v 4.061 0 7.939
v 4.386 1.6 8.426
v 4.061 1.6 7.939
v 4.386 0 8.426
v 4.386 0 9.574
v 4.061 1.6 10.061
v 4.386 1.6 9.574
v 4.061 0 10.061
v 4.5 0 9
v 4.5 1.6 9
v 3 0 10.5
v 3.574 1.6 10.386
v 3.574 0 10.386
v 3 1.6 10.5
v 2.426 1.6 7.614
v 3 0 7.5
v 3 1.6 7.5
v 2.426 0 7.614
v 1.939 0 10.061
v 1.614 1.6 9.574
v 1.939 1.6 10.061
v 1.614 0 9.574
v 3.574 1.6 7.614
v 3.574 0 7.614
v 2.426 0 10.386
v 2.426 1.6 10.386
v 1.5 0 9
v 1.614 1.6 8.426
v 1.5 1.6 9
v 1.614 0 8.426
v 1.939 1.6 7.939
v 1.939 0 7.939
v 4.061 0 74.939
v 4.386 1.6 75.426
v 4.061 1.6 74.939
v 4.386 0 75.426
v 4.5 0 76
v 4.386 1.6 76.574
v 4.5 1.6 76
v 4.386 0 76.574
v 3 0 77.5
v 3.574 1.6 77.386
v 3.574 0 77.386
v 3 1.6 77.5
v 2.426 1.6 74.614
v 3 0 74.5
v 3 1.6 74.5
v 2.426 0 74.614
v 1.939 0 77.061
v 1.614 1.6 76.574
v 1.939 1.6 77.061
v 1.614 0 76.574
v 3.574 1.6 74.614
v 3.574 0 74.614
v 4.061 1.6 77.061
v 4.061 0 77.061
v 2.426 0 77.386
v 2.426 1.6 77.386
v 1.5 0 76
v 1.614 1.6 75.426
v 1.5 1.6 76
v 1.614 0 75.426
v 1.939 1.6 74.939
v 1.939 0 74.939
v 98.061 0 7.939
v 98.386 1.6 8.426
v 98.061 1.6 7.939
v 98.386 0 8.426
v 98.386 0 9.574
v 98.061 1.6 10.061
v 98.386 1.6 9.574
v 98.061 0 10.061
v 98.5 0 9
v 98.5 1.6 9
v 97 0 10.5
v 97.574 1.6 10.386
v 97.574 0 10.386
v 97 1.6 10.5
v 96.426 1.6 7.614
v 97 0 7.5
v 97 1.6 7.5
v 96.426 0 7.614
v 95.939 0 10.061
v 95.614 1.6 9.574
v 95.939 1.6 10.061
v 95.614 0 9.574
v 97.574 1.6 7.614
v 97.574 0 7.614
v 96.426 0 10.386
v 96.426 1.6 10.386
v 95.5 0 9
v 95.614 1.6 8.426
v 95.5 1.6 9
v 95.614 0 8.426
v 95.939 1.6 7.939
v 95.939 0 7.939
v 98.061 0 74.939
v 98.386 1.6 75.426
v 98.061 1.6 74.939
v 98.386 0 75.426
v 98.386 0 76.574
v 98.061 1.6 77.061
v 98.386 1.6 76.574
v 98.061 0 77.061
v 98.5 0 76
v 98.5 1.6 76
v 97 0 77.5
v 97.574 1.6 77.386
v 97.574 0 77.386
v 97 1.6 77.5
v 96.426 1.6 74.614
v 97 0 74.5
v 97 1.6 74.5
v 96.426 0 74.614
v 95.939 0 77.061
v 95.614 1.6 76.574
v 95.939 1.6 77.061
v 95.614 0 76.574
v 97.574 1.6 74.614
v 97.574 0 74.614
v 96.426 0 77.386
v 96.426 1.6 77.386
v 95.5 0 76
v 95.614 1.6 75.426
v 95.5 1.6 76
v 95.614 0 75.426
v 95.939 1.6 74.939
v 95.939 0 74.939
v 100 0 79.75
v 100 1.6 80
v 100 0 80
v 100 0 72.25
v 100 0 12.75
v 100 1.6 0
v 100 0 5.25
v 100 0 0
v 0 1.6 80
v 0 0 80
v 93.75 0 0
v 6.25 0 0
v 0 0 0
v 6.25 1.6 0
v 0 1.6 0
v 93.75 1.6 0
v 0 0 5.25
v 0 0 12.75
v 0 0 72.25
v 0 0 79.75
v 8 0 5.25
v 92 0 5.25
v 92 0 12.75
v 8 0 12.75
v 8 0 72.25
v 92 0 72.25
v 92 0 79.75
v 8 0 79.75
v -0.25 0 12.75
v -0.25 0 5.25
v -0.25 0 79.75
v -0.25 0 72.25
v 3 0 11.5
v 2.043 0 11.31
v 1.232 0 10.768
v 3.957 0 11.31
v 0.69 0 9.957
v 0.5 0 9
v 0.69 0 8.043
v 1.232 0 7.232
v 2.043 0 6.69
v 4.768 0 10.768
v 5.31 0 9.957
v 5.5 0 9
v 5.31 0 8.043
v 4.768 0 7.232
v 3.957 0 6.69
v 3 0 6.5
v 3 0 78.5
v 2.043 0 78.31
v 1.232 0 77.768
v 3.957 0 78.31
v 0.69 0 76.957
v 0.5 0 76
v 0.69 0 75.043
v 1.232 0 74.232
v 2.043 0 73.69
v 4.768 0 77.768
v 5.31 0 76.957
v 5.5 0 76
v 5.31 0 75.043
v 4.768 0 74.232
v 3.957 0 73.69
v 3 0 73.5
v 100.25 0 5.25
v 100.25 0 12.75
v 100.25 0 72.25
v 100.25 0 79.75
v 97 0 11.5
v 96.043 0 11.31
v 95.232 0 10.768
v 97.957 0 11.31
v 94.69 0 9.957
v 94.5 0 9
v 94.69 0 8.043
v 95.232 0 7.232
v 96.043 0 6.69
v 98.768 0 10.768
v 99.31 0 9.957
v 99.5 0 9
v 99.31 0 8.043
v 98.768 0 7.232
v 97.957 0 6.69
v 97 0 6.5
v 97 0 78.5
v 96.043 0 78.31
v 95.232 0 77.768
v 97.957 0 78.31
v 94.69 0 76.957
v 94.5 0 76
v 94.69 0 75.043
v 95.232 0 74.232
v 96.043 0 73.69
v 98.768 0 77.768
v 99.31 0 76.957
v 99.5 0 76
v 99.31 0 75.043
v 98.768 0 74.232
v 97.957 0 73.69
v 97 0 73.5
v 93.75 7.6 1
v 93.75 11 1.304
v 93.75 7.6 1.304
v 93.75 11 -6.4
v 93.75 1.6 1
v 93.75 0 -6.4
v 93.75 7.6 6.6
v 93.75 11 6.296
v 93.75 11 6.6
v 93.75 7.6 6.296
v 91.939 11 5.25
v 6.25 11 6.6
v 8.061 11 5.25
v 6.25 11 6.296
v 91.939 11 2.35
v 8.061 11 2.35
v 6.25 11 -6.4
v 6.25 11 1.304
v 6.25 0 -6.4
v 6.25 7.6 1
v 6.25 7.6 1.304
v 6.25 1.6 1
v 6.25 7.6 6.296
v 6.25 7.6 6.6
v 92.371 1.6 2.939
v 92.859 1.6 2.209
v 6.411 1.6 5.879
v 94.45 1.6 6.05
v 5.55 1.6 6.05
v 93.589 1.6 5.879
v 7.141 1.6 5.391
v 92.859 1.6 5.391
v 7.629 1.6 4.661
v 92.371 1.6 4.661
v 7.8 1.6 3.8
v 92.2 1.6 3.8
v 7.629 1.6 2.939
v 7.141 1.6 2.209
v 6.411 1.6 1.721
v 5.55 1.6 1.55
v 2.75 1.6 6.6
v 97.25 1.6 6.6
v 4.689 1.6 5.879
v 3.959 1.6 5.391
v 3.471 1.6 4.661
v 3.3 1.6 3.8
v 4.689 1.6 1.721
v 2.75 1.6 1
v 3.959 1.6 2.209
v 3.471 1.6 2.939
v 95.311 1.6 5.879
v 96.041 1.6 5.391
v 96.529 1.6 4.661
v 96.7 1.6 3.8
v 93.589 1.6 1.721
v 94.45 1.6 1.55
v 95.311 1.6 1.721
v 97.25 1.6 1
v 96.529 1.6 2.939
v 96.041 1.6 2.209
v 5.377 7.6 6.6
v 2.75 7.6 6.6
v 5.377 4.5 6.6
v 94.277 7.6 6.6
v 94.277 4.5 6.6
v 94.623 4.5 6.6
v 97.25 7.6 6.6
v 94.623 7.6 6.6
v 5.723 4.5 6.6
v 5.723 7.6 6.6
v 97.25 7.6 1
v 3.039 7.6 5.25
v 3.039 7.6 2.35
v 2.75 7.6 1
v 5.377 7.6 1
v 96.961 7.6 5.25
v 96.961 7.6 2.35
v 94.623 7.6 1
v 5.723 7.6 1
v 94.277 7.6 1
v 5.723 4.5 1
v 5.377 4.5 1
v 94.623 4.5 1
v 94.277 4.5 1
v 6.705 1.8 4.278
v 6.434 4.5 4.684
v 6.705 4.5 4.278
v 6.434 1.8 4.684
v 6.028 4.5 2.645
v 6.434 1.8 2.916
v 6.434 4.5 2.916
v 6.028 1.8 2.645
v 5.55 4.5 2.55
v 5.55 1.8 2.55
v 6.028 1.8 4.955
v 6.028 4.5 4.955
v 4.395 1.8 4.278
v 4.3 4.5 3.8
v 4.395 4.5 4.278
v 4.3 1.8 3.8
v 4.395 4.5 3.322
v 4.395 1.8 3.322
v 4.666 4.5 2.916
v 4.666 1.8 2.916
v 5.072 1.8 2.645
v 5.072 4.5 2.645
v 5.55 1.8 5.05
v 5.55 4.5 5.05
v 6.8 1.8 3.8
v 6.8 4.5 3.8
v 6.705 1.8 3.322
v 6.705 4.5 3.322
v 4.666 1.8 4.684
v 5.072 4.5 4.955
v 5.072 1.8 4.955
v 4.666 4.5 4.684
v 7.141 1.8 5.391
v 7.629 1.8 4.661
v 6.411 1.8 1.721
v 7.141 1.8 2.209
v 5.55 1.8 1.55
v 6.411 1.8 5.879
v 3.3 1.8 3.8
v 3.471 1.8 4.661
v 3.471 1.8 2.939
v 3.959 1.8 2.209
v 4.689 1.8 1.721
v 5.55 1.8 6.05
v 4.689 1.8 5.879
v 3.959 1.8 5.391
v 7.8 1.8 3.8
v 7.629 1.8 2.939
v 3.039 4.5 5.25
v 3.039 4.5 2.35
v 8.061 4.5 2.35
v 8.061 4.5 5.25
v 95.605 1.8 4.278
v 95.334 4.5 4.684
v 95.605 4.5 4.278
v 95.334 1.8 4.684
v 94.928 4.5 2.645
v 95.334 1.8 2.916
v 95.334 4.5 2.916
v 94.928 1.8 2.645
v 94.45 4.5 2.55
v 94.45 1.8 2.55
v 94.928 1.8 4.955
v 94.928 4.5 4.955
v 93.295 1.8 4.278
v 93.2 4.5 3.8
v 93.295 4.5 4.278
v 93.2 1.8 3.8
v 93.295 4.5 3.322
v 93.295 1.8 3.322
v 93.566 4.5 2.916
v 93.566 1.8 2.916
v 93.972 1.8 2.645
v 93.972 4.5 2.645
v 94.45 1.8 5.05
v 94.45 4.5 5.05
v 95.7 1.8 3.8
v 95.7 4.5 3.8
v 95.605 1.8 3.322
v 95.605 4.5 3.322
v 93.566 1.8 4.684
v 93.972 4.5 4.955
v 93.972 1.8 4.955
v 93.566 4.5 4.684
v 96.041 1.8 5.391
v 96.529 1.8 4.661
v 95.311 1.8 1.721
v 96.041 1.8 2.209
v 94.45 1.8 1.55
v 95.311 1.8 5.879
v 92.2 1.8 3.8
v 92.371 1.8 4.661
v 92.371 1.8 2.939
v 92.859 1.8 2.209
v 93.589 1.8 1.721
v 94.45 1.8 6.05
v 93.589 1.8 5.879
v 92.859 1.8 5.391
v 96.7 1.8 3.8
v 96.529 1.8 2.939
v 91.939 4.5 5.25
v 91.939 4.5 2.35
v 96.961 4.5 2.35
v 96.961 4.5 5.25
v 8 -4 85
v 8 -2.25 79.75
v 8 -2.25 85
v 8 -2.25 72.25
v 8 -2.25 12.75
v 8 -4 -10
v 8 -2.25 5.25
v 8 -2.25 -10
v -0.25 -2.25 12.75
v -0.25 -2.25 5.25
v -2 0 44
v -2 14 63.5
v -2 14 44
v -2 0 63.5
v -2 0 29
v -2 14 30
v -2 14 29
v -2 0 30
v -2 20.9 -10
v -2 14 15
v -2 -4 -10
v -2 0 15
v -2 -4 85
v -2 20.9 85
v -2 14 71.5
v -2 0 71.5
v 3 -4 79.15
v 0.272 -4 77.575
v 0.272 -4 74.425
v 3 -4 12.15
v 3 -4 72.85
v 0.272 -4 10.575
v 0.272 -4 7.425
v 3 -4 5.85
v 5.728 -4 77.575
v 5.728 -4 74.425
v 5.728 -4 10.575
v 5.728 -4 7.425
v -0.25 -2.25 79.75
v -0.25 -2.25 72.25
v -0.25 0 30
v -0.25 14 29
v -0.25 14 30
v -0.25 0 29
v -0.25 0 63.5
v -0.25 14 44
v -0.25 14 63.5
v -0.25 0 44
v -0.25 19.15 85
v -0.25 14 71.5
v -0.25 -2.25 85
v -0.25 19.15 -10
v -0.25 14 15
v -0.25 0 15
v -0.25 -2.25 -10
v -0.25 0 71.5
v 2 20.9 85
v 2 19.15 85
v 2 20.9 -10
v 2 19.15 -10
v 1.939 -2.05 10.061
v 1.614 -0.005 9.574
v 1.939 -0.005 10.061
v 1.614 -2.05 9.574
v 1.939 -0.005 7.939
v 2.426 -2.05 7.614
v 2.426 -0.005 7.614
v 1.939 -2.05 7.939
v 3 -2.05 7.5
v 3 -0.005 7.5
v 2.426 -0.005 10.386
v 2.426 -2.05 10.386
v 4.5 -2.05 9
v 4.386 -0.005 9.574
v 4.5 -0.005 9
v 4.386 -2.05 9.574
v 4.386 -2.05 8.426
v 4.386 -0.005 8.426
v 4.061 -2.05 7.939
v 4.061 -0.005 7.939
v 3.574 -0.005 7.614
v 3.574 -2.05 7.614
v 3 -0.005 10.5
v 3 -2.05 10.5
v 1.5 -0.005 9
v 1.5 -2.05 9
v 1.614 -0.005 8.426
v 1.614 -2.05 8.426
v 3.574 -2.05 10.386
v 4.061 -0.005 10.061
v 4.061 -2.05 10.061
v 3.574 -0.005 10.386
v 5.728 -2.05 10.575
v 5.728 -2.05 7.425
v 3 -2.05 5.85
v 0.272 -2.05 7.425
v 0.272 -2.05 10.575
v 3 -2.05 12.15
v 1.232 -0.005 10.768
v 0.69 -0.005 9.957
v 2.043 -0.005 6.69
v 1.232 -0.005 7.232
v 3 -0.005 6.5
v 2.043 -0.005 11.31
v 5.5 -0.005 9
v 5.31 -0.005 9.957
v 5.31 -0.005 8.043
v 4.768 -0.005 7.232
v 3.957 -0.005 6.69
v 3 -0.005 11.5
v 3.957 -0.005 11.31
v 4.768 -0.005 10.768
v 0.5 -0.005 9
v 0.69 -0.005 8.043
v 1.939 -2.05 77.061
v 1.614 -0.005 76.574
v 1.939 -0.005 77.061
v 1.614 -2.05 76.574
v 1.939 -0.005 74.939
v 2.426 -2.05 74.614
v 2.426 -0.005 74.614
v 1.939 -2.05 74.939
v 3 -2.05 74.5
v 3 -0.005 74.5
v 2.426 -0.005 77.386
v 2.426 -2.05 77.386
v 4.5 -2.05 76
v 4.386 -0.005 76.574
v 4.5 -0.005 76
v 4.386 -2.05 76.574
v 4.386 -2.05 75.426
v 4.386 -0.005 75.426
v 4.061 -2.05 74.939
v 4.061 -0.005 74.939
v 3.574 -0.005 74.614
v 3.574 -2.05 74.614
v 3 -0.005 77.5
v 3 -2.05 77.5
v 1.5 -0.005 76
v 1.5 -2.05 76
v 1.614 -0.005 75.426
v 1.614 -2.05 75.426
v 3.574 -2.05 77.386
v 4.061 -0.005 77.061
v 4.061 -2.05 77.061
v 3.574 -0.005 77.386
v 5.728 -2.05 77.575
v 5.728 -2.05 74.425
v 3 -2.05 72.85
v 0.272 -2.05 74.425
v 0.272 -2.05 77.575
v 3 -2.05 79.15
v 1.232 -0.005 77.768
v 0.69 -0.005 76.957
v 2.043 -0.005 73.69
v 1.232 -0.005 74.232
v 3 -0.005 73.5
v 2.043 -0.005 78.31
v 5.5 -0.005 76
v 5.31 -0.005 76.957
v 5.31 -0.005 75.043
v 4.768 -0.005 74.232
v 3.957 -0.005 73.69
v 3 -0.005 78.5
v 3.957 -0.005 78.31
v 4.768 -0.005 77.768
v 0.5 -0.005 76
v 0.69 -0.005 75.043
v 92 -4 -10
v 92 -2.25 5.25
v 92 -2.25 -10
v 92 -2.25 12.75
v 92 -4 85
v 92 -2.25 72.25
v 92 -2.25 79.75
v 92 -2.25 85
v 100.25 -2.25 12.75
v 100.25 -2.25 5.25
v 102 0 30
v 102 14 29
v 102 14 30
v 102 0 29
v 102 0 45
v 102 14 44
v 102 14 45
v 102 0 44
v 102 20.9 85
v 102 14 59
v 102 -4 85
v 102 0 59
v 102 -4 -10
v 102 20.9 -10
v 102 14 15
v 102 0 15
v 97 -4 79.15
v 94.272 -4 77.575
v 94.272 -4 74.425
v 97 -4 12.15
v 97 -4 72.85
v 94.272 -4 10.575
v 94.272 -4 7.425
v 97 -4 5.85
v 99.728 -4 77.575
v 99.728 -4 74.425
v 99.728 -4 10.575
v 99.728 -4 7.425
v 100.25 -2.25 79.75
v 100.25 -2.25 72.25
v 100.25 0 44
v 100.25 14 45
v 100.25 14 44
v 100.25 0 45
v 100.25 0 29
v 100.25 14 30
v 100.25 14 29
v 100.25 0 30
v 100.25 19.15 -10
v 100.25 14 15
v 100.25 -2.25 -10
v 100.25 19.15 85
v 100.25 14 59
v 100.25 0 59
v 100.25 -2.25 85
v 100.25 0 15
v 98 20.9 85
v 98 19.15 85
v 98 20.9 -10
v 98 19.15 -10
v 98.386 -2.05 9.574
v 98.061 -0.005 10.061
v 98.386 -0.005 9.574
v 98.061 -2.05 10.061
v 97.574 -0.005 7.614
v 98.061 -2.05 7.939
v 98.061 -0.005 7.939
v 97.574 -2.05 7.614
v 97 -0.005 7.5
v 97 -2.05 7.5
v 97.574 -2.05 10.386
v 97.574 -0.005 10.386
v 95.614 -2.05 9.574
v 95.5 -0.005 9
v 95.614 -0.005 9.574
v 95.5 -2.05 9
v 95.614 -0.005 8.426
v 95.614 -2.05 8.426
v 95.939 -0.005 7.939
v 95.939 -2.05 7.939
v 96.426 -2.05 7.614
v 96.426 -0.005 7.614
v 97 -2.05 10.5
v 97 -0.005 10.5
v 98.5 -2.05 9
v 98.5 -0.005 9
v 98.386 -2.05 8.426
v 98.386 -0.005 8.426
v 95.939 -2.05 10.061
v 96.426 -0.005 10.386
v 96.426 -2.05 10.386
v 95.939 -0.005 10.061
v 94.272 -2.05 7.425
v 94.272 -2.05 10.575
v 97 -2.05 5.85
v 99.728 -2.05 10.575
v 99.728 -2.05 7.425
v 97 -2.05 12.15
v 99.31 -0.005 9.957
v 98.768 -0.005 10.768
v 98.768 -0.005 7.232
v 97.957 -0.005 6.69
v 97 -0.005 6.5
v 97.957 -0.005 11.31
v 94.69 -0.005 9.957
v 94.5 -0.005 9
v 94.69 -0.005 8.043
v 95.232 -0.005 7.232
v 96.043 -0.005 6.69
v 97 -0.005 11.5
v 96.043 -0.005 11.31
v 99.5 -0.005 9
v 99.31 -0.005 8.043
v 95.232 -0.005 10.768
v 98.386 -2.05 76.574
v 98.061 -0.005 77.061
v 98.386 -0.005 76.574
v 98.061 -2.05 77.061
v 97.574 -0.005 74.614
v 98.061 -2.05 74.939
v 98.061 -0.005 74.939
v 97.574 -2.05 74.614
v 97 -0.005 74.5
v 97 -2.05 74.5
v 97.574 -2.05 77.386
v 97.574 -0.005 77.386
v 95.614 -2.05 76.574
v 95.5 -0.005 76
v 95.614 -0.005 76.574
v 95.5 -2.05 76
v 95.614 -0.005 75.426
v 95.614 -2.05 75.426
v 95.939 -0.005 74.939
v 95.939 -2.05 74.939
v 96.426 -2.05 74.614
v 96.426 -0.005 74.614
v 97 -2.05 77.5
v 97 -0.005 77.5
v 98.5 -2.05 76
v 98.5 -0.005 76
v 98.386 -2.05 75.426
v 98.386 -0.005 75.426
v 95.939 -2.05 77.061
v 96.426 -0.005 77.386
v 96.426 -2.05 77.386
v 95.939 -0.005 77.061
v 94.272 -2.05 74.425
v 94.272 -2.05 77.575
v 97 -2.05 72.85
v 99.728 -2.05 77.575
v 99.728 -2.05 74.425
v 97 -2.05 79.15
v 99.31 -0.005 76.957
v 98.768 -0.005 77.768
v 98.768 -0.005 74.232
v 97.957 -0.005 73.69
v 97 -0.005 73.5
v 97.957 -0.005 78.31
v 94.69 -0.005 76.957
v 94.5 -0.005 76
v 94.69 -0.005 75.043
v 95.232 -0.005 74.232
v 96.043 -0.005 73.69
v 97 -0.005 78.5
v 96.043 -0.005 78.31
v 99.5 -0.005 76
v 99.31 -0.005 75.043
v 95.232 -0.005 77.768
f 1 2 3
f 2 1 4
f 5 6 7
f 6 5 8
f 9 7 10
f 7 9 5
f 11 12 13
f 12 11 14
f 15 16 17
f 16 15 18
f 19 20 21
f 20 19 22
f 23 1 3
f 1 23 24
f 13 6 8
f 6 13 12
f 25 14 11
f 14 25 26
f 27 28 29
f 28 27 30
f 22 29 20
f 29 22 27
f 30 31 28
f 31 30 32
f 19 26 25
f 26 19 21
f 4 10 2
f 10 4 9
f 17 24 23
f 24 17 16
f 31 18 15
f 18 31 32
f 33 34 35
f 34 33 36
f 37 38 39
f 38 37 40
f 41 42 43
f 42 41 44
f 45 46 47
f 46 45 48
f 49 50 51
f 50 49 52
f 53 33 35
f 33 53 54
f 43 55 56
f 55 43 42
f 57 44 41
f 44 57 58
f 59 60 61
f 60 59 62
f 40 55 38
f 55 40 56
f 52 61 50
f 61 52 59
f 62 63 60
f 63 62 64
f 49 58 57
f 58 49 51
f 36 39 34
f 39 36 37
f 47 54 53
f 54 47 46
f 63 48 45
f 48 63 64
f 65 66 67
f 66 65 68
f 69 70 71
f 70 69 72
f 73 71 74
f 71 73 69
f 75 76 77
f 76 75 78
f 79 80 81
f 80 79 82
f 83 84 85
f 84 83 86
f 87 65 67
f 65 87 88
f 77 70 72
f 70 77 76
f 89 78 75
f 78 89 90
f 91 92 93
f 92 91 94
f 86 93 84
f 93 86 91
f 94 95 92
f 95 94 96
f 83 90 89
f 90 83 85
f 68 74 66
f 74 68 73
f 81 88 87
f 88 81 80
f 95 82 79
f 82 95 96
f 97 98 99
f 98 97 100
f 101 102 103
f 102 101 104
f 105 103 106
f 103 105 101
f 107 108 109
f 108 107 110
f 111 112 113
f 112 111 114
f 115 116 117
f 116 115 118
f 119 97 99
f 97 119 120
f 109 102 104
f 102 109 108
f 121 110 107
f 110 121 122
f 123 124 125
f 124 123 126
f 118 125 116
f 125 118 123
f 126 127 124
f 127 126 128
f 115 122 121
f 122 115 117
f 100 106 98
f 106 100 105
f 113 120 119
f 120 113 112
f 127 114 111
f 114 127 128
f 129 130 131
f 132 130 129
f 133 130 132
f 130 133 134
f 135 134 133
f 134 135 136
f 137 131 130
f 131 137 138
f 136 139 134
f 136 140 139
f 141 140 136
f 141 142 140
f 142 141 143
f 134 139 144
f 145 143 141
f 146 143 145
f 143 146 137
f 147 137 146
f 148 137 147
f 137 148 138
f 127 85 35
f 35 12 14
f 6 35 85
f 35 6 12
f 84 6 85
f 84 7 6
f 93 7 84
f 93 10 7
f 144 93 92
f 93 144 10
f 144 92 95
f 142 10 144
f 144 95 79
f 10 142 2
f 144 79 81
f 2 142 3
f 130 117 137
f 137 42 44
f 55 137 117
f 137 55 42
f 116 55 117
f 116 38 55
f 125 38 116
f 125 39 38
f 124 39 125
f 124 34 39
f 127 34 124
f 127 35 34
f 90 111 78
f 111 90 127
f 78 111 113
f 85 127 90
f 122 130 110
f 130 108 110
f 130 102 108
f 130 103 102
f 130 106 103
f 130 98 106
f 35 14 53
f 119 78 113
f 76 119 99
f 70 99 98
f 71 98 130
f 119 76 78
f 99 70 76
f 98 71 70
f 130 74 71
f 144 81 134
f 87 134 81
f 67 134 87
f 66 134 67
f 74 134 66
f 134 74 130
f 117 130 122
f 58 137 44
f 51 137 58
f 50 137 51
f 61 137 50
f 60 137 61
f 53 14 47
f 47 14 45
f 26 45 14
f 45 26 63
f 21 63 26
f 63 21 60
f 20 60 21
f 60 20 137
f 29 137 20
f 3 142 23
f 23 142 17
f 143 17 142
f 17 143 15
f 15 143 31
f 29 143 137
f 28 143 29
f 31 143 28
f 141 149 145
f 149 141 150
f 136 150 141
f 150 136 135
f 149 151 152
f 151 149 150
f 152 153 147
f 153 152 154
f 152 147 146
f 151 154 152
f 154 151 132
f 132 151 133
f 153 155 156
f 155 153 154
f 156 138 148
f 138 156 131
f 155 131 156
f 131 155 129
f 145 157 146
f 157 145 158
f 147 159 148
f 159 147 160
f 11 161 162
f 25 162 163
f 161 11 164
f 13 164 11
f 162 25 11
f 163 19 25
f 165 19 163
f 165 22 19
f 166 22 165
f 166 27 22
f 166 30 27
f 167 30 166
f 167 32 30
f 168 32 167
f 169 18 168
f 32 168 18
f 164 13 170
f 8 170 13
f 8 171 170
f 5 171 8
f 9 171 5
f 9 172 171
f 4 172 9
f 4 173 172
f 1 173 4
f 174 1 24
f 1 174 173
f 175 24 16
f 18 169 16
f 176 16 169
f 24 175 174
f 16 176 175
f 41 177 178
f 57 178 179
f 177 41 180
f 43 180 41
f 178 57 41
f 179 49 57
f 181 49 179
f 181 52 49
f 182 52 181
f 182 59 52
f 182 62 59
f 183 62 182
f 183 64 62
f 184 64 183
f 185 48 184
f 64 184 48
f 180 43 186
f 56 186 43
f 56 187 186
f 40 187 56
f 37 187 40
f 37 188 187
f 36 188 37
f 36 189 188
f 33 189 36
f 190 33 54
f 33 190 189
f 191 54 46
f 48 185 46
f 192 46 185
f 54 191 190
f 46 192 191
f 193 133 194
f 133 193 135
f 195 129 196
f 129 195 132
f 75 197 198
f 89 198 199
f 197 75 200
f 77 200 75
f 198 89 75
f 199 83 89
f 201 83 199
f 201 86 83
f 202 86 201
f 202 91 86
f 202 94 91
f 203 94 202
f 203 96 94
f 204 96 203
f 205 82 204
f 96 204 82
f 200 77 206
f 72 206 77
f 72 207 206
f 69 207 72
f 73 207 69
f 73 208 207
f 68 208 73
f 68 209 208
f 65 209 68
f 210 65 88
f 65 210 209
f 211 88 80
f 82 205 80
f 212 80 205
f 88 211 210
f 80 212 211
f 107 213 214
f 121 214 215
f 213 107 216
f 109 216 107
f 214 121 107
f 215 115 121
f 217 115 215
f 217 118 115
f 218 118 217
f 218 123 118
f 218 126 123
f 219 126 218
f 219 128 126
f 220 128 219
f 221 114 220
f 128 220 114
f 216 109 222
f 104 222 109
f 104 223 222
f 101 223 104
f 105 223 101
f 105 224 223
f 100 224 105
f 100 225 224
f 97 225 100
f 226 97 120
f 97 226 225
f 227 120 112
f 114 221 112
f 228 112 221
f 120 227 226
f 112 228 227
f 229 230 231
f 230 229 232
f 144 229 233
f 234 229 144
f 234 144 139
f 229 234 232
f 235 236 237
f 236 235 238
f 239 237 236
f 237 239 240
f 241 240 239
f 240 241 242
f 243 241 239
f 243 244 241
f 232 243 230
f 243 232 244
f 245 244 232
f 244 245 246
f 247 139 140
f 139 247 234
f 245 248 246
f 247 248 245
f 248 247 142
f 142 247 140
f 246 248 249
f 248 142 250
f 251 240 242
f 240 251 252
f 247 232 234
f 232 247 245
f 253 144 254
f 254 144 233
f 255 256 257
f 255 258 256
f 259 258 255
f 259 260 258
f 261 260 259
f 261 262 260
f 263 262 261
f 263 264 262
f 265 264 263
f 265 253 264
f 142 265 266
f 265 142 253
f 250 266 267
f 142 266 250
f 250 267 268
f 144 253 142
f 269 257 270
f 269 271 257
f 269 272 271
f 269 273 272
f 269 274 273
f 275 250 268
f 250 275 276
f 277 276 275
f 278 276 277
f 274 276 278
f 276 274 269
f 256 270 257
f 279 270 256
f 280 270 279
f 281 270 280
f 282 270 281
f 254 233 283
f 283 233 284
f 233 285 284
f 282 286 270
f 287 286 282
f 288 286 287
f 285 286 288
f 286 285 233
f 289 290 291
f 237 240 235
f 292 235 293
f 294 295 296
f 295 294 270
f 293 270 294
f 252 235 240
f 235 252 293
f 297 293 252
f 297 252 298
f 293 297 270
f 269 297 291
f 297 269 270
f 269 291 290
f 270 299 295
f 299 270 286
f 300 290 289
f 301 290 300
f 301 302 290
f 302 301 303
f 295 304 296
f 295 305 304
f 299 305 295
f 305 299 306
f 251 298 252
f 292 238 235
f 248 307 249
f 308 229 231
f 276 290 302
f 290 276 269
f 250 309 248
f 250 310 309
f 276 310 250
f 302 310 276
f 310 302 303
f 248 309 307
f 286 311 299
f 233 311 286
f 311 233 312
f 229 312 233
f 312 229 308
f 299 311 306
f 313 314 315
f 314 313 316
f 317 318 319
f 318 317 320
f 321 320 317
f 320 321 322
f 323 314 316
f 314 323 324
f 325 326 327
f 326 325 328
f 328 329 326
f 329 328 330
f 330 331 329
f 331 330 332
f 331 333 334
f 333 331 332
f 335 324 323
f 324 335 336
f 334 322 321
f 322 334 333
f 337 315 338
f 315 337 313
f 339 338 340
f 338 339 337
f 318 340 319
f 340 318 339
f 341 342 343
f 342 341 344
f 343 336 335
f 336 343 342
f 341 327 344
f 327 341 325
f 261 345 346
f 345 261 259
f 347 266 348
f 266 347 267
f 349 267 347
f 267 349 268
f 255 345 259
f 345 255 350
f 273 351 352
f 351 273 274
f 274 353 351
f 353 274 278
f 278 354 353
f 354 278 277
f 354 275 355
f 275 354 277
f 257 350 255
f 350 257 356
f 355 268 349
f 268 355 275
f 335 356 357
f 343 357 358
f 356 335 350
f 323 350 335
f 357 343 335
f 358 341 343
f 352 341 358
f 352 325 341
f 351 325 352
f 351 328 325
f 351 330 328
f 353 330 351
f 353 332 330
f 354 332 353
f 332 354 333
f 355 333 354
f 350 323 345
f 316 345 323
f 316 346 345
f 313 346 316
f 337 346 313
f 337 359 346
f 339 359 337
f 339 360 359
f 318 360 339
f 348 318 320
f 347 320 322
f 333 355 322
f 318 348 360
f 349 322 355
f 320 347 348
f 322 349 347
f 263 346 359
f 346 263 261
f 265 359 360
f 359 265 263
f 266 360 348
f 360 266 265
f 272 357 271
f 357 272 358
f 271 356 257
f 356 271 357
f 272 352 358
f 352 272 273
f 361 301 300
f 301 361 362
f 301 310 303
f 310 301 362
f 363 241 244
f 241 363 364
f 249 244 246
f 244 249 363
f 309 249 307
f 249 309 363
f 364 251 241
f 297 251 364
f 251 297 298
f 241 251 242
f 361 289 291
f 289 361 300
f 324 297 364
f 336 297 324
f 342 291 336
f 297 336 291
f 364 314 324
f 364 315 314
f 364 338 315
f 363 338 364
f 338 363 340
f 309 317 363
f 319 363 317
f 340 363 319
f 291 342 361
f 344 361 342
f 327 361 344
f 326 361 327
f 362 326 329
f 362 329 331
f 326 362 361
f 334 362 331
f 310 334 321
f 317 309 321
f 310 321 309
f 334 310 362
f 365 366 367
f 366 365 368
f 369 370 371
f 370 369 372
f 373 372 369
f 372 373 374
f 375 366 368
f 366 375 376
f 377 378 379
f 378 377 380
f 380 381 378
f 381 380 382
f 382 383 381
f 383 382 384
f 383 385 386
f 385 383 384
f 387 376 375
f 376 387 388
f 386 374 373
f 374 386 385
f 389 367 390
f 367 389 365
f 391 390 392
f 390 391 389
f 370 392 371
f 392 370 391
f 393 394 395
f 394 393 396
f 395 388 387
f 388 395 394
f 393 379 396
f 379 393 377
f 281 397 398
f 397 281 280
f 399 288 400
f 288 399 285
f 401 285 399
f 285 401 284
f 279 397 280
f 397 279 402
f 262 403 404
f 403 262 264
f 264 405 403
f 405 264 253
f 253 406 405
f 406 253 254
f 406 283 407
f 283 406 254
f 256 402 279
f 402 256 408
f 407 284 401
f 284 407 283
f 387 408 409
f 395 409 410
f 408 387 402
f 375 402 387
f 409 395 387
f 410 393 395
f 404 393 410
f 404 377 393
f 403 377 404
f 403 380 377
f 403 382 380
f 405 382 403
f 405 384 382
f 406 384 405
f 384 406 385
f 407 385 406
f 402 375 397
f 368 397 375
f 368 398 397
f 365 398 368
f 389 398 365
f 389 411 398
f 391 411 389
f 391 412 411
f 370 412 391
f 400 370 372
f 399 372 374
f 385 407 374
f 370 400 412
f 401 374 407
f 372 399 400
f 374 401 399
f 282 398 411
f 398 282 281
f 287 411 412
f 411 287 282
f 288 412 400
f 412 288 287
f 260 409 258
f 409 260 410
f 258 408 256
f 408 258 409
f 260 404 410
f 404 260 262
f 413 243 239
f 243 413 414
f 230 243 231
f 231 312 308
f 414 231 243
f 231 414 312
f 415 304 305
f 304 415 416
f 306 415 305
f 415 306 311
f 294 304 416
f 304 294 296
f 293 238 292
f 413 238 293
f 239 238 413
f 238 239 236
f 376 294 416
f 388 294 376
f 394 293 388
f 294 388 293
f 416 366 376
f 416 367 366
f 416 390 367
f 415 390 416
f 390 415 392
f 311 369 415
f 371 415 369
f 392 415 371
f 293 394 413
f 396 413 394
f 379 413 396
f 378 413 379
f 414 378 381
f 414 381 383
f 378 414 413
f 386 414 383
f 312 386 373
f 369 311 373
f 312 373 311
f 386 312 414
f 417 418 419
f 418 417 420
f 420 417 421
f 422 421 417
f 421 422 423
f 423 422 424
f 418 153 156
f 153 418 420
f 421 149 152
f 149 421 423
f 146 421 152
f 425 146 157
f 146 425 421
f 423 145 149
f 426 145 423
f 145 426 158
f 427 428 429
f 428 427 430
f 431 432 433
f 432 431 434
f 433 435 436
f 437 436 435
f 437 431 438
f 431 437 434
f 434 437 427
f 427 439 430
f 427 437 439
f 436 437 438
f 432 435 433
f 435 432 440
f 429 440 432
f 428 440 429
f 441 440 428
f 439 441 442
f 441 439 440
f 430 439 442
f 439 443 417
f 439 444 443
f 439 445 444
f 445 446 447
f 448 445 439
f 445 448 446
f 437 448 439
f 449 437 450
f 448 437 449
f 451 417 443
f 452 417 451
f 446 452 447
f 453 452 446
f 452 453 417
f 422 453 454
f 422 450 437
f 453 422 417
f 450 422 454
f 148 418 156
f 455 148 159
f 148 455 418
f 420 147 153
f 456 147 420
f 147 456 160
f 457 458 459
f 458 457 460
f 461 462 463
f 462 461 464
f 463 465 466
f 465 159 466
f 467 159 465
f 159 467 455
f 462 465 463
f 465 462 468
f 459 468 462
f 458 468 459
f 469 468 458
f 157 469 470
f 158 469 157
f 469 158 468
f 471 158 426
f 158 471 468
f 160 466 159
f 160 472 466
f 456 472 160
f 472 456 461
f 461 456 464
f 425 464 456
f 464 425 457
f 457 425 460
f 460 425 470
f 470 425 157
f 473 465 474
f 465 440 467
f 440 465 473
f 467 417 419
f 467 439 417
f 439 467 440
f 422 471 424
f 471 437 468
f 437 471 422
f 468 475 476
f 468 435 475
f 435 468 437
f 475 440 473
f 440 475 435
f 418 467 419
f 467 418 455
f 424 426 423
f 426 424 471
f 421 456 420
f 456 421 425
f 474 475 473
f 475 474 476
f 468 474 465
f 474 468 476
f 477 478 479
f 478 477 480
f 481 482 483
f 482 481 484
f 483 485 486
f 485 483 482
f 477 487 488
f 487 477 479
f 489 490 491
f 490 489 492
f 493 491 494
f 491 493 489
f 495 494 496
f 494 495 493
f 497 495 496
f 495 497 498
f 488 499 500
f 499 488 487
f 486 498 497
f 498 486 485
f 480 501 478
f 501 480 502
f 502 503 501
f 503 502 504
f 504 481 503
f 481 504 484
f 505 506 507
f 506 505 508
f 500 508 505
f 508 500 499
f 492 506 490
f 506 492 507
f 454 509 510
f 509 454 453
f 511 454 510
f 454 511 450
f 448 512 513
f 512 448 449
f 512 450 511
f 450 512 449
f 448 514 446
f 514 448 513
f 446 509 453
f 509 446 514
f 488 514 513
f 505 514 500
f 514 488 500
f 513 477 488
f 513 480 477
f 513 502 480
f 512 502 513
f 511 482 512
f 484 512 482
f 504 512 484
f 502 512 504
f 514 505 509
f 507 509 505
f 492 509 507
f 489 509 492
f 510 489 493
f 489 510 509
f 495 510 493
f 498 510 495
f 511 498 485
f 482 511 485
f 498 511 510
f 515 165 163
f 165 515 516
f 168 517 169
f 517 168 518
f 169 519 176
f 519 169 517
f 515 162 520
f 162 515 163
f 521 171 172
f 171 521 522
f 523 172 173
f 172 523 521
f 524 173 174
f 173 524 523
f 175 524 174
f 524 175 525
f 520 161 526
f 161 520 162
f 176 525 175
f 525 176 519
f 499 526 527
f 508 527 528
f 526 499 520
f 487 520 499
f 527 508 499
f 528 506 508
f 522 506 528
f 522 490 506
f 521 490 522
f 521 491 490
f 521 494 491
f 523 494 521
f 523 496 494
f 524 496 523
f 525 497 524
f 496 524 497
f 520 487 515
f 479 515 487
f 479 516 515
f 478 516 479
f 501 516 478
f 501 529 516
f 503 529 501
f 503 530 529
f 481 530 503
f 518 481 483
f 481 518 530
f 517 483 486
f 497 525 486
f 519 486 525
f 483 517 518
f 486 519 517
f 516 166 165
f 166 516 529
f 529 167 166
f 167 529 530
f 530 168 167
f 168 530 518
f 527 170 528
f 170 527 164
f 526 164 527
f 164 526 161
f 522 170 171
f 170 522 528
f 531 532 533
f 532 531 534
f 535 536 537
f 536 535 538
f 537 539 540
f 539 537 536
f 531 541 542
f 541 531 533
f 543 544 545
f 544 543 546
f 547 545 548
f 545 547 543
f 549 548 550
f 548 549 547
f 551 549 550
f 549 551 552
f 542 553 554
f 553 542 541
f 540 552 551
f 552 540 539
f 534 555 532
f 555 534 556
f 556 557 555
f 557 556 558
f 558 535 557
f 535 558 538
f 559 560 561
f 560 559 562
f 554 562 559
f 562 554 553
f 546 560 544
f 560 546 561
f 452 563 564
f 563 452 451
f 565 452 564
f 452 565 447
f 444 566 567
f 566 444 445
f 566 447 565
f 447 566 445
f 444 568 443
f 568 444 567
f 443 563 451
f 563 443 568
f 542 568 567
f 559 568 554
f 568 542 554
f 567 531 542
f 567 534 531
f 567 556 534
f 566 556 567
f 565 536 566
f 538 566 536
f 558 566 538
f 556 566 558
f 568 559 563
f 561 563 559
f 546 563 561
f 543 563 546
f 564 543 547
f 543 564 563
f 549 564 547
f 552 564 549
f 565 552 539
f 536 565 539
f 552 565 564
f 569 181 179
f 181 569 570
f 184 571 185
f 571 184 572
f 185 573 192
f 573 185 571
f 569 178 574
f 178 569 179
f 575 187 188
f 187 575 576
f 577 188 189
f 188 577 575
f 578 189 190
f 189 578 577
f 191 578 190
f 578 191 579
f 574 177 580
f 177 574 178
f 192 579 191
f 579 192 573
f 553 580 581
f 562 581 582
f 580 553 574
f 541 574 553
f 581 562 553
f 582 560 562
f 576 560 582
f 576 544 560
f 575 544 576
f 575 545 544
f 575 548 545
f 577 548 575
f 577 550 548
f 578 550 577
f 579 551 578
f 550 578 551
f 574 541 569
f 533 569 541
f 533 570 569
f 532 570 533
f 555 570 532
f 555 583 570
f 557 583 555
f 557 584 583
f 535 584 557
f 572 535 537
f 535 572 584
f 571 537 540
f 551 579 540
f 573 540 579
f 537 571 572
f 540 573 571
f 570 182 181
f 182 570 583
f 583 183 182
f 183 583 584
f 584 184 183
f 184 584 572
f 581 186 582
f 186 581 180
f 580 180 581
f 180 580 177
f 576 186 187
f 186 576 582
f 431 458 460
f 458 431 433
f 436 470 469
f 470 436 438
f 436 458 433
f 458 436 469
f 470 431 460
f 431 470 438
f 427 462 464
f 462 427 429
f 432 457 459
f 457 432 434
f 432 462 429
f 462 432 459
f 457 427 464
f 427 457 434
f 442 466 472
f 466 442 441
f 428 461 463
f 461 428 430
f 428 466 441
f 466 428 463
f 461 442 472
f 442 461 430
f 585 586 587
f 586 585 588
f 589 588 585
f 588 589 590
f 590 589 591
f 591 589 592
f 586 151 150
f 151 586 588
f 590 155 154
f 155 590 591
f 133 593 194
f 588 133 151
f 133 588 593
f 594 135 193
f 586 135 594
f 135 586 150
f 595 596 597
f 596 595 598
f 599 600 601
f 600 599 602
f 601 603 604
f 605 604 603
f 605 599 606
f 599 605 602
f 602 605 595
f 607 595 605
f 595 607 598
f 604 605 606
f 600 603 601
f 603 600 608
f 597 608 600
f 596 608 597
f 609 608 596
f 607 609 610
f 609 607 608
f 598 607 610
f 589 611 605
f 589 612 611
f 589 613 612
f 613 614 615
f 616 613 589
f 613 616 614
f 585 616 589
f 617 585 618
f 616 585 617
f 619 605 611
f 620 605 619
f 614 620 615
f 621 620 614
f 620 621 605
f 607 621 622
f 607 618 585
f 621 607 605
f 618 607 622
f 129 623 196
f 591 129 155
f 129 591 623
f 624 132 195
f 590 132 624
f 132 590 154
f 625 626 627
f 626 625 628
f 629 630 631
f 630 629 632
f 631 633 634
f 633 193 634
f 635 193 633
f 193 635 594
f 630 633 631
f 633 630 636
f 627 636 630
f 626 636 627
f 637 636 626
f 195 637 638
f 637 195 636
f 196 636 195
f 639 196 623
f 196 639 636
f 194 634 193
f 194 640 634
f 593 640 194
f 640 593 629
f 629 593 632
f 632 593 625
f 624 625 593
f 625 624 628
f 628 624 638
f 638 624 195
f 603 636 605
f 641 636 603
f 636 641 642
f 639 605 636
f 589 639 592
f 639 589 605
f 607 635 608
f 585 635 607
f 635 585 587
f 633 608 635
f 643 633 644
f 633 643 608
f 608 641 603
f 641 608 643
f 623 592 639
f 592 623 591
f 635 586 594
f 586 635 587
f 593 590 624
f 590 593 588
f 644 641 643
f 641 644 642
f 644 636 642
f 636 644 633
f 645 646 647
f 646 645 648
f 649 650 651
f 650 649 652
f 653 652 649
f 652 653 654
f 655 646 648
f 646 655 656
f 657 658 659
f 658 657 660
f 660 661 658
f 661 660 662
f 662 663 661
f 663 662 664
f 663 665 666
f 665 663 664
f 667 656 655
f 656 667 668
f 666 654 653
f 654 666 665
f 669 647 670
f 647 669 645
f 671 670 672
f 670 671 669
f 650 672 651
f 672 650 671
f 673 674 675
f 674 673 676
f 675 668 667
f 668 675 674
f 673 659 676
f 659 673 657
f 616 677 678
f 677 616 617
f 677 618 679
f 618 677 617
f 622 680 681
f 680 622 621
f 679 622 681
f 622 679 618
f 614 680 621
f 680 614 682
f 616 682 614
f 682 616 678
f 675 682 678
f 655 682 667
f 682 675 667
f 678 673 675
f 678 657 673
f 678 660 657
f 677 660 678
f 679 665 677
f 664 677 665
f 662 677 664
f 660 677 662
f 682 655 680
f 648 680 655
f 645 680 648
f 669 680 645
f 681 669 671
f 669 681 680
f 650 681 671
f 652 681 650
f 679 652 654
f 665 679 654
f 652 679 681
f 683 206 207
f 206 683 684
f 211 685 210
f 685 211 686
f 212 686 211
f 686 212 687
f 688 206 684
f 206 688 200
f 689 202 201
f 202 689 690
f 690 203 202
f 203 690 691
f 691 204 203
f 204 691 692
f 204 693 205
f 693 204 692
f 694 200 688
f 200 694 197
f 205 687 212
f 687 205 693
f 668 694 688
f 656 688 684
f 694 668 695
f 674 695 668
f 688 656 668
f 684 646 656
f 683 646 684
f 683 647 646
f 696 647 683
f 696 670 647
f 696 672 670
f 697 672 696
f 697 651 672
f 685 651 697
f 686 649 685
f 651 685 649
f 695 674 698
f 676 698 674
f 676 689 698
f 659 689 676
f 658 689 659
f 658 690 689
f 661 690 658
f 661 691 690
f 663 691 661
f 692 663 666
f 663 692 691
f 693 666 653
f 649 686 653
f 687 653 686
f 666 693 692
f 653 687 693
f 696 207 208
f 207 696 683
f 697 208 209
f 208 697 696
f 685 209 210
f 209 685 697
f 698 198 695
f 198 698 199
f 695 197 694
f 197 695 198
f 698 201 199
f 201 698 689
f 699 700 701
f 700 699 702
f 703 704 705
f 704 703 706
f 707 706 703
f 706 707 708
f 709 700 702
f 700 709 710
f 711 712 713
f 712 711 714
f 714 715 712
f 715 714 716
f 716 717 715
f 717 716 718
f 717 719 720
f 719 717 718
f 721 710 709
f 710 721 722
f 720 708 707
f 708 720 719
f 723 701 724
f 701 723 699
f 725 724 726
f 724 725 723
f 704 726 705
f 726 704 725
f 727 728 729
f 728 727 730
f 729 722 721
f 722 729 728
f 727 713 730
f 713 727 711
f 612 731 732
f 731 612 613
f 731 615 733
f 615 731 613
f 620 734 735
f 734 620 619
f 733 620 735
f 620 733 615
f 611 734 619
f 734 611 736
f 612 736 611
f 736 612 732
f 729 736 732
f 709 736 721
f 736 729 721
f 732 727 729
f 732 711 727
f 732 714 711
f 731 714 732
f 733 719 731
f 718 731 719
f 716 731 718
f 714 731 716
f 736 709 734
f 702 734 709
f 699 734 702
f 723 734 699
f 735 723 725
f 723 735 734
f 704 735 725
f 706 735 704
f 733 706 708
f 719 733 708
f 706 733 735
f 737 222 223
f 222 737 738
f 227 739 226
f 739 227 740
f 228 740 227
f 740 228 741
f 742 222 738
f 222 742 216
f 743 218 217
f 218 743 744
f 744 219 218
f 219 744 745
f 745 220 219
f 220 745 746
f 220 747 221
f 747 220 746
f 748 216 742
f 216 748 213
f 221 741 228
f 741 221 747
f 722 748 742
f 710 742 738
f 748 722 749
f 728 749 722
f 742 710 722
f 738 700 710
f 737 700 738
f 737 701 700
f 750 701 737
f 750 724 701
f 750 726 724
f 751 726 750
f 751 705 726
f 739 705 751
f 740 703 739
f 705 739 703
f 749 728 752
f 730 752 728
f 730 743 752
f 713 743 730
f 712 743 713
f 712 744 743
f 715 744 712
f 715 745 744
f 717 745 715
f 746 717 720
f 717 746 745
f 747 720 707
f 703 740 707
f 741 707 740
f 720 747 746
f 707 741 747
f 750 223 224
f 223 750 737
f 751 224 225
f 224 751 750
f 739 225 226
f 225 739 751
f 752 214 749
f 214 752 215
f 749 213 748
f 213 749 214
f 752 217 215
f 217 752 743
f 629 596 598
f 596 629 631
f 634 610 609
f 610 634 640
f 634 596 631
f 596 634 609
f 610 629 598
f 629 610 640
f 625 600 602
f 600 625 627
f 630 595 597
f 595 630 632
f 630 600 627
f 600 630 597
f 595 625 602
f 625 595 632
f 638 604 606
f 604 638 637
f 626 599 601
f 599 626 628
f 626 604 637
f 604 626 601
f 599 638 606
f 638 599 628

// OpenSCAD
// file: ../library/din41612/din41612_male.scad
// din41612 male connector
// =======================

include <din41612_male_dim.scad>

use <../linurs/linurs_screw.scad>

module din41612_male(){ 
  // color("LightGrey")
  difference(){
    union(){
        translate([0,din41612_male_w1/2,din41612_male_h/2-din41612_male_h1])  
        cube([din41612_male_l1,
              din41612_male_w1,
              din41612_male_h],
             center=true);  
      translate([0,(din41612_male_w1-din41612_male_w)/2,(din41612_male_h-din41612_male_h1)/2]) 
        cube([din41612_male_l1,
              (din41612_male_w-din41612_male_w1),
              din41612_male_h-din41612_male_h1],
             center=true);  
      translate([0,din41612_male_w2/2+din41612_male_w1-din41612_male_w,din41612_male_h2/2])
        cube([din41612_male_l,
              din41612_male_w2,
              din41612_male_h2],
             center=true);  
    }
    for(i=[-1,1]){ // mounting holes
      translate([i*din41612_male_dl/2,
                 din41612_male_w1-din41612_male_w+din41612_male_w2/2, 
                 din41612_male_h1])
      rotate([180,0,90])screw_fix(
            w=din41612_male_h2, 
            d=M2_5, 
            type=head_cyl, 
            nut_sink=din41612_male_h,
            t=0);
    }
  }
}
din41612_male();  
// file: ../library/din41612/din41612_male_dim.scad
include <../linurs/linurs_screw_dim.scad>

// connector dimensions
din41612_male_l=94.5;    // lenght of the connector
din41612_male_l1=87.5;   // 
din41612_male_w=13;      // width of the connector
din41612_male_w1=6.4;    // 
din41612_male_w2=5.6;    // 
din41612_male_h=11;      // height of the connector
din41612_male_h1=1.6;    // 
din41612_male_h2=6;      // 

din41612_male_dl=88.9;   // distance between mounting holes
// file: ../library/din41612/din41612_female_dim.scad
include <../linurs/linurs_screw_dim.scad>

// connector dimensions
din41612_female_l=95;       // lenght of the connector
din41612_female_l1=85;      // lenght of the connector head
din41612_female_h=11.6;     // height of the connector
din41612_female_h1=5.2;     // height produced by the connector when pulgged in 
din41612_female_w=11;       // width of the connector
din41612_female_w1=8.5;     // width of the connector head

din41612_female_dl=90;      // distance between mounting holes
// file: ../pcb/pcb.scad
// pcb
// ===
// The pcb is the master object and has its 
// lower left corner solder side at the origin of the 
// coordinate system 

n=2;  // [1,2,3,4,5,6,7,8]
show_pcb="assemblies"; // [assemblies,assembly,pcb]

include <pcb_dim.scad>
include <../motherboard/motherboard_dim.scad>

use <../library/din41612/din41612_male.scad>

module pcb(){
  echo("pcb");  
  color("greenyellow")
  difference(){
    cube([pcb_l,pcb_h,pcb_w]); // pcb
    for(x=[-1,1]){ // mounting holes
      for(y=[pcb_wd1,pcb_wd1+pcb_wd]){
        translate([x*pcb_ld/2+pcb_l/2,0,y])
        rotate([90,0,0])
        cylinder(d=pcb_d,h=3*pcb_h,center=true,$fn=16);
      }
    }
  }
}

module pcb_assembly(){
  echo("pcb assembly");  
  pcb();  
  translate([pcb_l/2,pcb_h,0])  
  rotate([-90,0,0])din41612_male();  
}

module pcb_assemblies(n=1){
  echo("pcb assemblies"); 
  for(i=[0:n-1]){ // add the connectors
      echo(i);
      translate([0,step*i,0])
      pcb_assembly();
  }    
}    

if(show_pcb=="assemblies"){
  pcb_assemblies(n=n);
}

if(show_pcb=="assembly"){
  pcb_assembly();
}

if(show_pcb=="pcb"){
    // Move to center to create 2D drawings from top view 
    // with script OpenSCAD22d.py
    //
    rotate([90,0,180])
    //
    translate([-pcb_l/2,-pcb_h/2,-pcb_w/2])
    pcb();
}
// file: ../bracket/bracket.scad
// bracket
// =======
// A bracket of the elecbox module
// - type: 0 front bracket, 1 rear bracket
// - width 1..n in steps

// parameters for customizer
// bracket width
n=2; // [1,2,3,4,5,6,7,8]
// type
bracket="Front"; // [Front,Back]
// intermediate mounting holes
intermediate=false;  

include <../pcb/pcb_dim.scad>

include <../motherboard/motherboard_dim.scad>
include <../library/linurs/linurs_screw_dim.scad>
include <bracket_dim.scad>

use <../library/linurs/linurs_screw.scad>
    
module back_bracket(n=1, intermediate=false){
  mirror([1,0,0])       // mirror it if desired
  front_bracket(n=n, intermediate=intermediate); 
}
    
module front_bracket(n=1, intermediate=false){
  echo("bracket");  
  //color("White")
  intermediatestep=(intermediate)?step:0; 
  difference(){
    union(){
      translate([-bracket_h2/2-bracket_gap/2,
                 bracket_w(n)/2-bracket_w1,
                 bracket_l/2])  
      cube([bracket_h2,
            bracket_w(n),
            bracket_l],center=true); // create the bracket front
  
      translate([bracket_h/2-bracket_h2-bracket_gap/2,
                 bracket_t/2-bracket_w1,
                 bracket_l/2]) 
      cube([bracket_h,
            bracket_t,
            bracket_l],center=true); // U shape side of the screw
      
      translate([bracket_h1/2-bracket_h2-bracket_gap/2,
                 bracket_w(n)-bracket_w1-bracket_t/2,
                 bracket_l/2]) 
      cube([bracket_h1,
            bracket_t,
            bracket_l],center=true); // U shape where no screw  
      for(x=[1:n]){  // create the mounting hole cubes 
        for(z=[bracket_l1,
               bracket_l1+bracket_ld]){
          translate([ bracket_h/2-bracket_h2-bracket_gap/2,
                     -bracket_w1/2+(x-1)*intermediatestep,
                     z])
          cube([bracket_h,
                bracket_w1,
                bracket_l2],center=true);
        }
      }   
    }
    for(x=[1:n]){ // create the mounting hole 
      for(z=[bracket_l1,
             bracket_l1+bracket_ld]){
        translate([bracket_h3-bracket_h2-bracket_gap/2,
                  -bracket_w1/2+(x-1)*intermediatestep,
                   z])
        rotate([0,90,0])
        rotate([-90,0,0])
        screw_fix(w=bracket_w1,d=bracket_screw,type=head_no, t=bracket_screw_gap);
      }
    }
  }
}

if(bracket=="Front"){
  front_bracket(intermediate=intermediate,n=n);
}

if(bracket=="Back"){
  back_bracket(intermediate=intermediate,n=n);
}
// file: ../library/linurs/linurs_screw.scad
// Metric screws and nuts 
// urs@linurs.org 2019
// It is targeted for 3D printing applications. 
// To look realistic is not the goal (Example: Nuts do not have a hole)

include <linurs_screw_dim.scad>

d=0; //[0:M2_5,1:M3,2:M4,3:M5]
type=0;//[0:head_cyl,1:head_cnt,2:head_no,3:head_hex]
w=15; 
i=10;
nut_sink=0;
screw_sink=0; 
t=0.01;
fn=16;

/* [hex_bolt] */
show_hex_bolt=false;

/* [nut] */
show_nut=false;

/* [screw] */
show_screw=false;

/* [screw_fix] */
show_screw_fix=false;

/* [screw_cut] */
show_screw_cut=false;

/* [nut_cut] */
show_nut_cut=false;
wi=0; 
rot=false;

// functions used multiple times to position nuts and heads
function headh_cyl(d)=screw_cyl[d][1];  // height of cyl screw head
function headh_cnt(d)=screw_cyl[d][1];  // height of cnt screw head
function headh(d,type=head_cyl)=(type==head_cyl ? headh_cyl(d) : (type==head_cnt ? headh_cnt(d) : 0 )); // height of screw head 

function nuth(d)=screw_hex[d][2];   // height of hex nut

// head of a cylinder screw
module screw_head_cyl(d=M3, t=0)
{
  screwhd=screw_cyl[d][0]+t; // diameter of cylinder screw head
  cylinder(d=screwhd,h=headh(d=d, type=head_cyl), center=true,$fn=16); // screw head
}

// head of a countersunk screw
module screw_head_cnt(d=M3, t=0)
{
  screwd=screw_d[d]+t; 
  screwhd=screw_cnt[d][0]+t; // diameter of cylinder screw head
  cylinder(d1=screwd,d2=screwhd,h=headh(d=d,type=head_cnt), center=true,$fn=16); // screw head
}

// head of a hex screw
module screw_head_hex(d=M3, t=0)
{
    translate([0,0,-nuth(d)/2])nut(d=d, t=t);
}

// head of all screws
module screw_head(d=M3, type=head_cyl, t=0)
{ 
  if(type==head_cnt){
    screw_head_cnt(d=d, t=t);
  } else {
    if(type==head_cyl){
      screw_head_cyl(d=d, t=t);
    } else {
       if(type==head_hex){
           screw_head_hex(d=d, t=t); 
       } 
    }    
  }
}

// hex bolt 
module hex_bolt(d=M3, w=10, t=0)
{
  nutd=screw_hex[d][1]+t; // outer diameter of hex bolt
  cylinder(r=nutd/2,h=w+t, center=true,$fn=6); // nut
}

// nut 
module nut(d=M3, t=0)
{
  hex_bolt(d=d, w=nuth(d), t=t);    
}

// screw 
// w outer width of the screw = screw length + head 
module screw(w=10, d=M3, type=head_cyl, t=0){
  screwd=screw_d[d]+t;       // screw diameter
  cylinder(d=screwd, h=w, center=true,$fn=16); // screw thread length
  translate([0,0,w/2-headh(d=d,type=type)/2])
  screw_head(d=d,type=type, t=t);
}

// screw fix
// w outer width of the screw = screw length + head 
// sink additional material below to remove 
// raise additional material above to remove
module screw_fix(w=10, d=M3, type=head_cyl, screw_sink=0, nut_sink=0, t=0){
  screw(w=w, d=d, type=type, t=t);
  translate([0,0,-w/2+nuth(d)/2])
    nut(d=d,t=t);
  //additional material to be removed above the nut  
  translate([0,0,-(w+nut_sink)/2])hex_bolt(d=d,w=nut_sink+0.01,t=t);    
  //additional material to be removed above the screw head
  if(type==head_cnt){  
    translate([0,0,w/2+screw_sink])
    cylinder(d=screw_cnt[d][0]+t,h=screw_sink+0.01,center=true,$fn=16);
  }else{ 
    translate([0,0,(w+screw_sink)/2])
    cylinder(d=screw_cyl[d][0]+t,h=screw_sink+0.01,center=true,$fn=16);
  }     
}

// screw cut
// material to be extracted from object to slide in a counter sunk screw for fixation
// w height of the cut out
// i depth of the screw
module screw_cut(d=M3,w=20,i=10,t=0,fn=32){
    hsh=screw_cnt[d][1];
    ws=screw_cnt[d][0]+t;
    ds=screw_d[d]+t;
    
    translate([i/2,0,-(w-hsh)/2])
      cube([i,ws,hsh],center=true);
    
    translate([0,0,-(w-hsh)/2])
      cylinder(d=ws,h=hsh,center=true,$fn=32);
    
    translate([0,0,-(w-hsh)/2+hsh])
        cylinder(d2=ds, d1=ws, h=hsh,center=true,$fn=fn);
    
    cylinder(h=w, d=ds, center=true, $fn=fn);   
    
    translate([i/2,0,0]) 
        cube([i,ds,w],center=true);
    
    for(y=[-1,1]){
        translate([i/2,y*ds/2,-w/2+hsh])
            rotate([45,0,0])
            cube([i,sqrt(2)*(ws-ds)/2,sqrt(2)*(ws-ds)/2],center=true);
    }
}
//screw_cut();

// nut cut
// material to be extracted from object to slide in a nut for fixation
// w height of the cylinder
// i lenght of the inlet
module nut_cut(w=10, wi=0, d=M3, i=10, t=0, rot=false,type=head_cyl){ 
  r=(rot)?90:0;
  ds=(rot)?screw_hex[d][1]:screw_hex[d][0];
  rotate([0,0,r])nut(d,t);
  translate([i/2,0,0])
    cube([i,ds+t,nuth(d)+t],center=true);
  translate([0,0,-wi])
      if(type==head_cnt){    
          screw(w=w, d=d, type=type, t=t); 
        translate([0,0,w/2])
          cylinder(d=screw_cnt[d][0]+t,h=raise,center=true,$fn=16);
      }
      else{ 
          screw(w=w, d=d, type=type, t=t);   
  //      translate([0,0,0])
          //#cylinder(d=screw_cyl[d][0]+t,h=w,center=true,$fn=16);
      }       
}

if(show_hex_bolt==true){
   hex_bolt(d=d, w=w, t=t);
}

if(show_nut==true){
  nut(d=d, t=t);
}    

if(show_screw==true){
   screw(w=w, d=d, type=type, t=t);
}

if(show_screw_fix==true){
  screw_fix(w=w, d=d, type=type, nut_sink=nut_sink, screw_sink=screw_sink, t=t);
}

if(show_screw_cut==true){
  screw_cut(d=d,w=w,i=i,t=t,$fn=fn);
}    

if(show_nut_cut==true){
  nut_cut(w=w, wi=wi, d=d, i=i, t=t,rot=rot,type=type);
}  
// file: ../library/linurs/linurs_screw_dim.scad
// Metric screws and nuts 
// urs@linurs.org

// contains dimensions of linurs_screw and can be included in other 
// OpenScad files 

// Parameters in this file
// d screw diameter M2_5, M3, ... (enumeration with screw_d)
// t millimeters added to diameters 

// enumerations of metric threads
M2_5=0;
M3=1;
M4=2;
M5=3;

// enumerations screw head type
head_cyl=0; // cylinder
head_cnt=1; // countrsunk
head_no=2;  // no head at all
head_hex=3;  // no head at all

// screw diameters
screw_d=[
2.5, // M2.5
3.0, // M3
4.0, // M4
5.0  // M5
];

// sizes for hex nuts
screw_hex=[
//   s,   e,   h
 [ 5.0, 5.8, 1.7], // M2.5
 [ 5.5, 6.4, 2.0], // M3
 [ 7.0, 8.1, 2.8], // M4
 [ 8.0, 9.2, 3.5]  // M5
];

// sizes for cylinder screw heads
screw_cyl=[
//   d,   h
 [ 4.5, 1.6], // M2.5
 [ 5.5, 2.0], // M3
 [ 7.0, 2.6], // M4
 [ 8.5, 3.3]  // M5
];

// sizes for countersunk screw heads
screw_cnt=[
//   d,   h
 [ 4.7, 1.50], // M2.5
 [ 5.6, 1.65], // M3
 [ 7.4, 2.20], // M4
 [ 9.2, 2.50]  // M5
];
// file: ../motherboard/motherboard_dim.scad
include <../library/linurs/linurs_screw_dim.scad>
include <../library/din41612/din41612_female_dim.scad>
include <../library/din41612/din41612_male_dim.scad>
include <../pcb/pcb_dim.scad>
// motherboard pcb dimensions
motherboard_l=pcb_l;   // pcb width
motherboard_h=1.6;     // pcb thickness
step=25.4;             // distance between modules

function motherboard_w(n)=din41612_female_w+step*(n-1);

screw_motherboard_d=M2_5;
screw_motherboard_l=16;
motherboard_pass=0.5;// gap to fit screws 

motherboard_z_offset=-din41612_male_w1-din41612_female_h1-motherboard_h;
// file: ../bracket/bracket_dim.scad
// bracket

include <../pcb/pcb_dim.scad>
include <../motherboard/motherboard_dim.scad>
include <../library/linurs/linurs_screw_dim.scad>

bracket_screw=M2_5;   // hole for the screw

bracket_gap=0.5;      // gap between bracket to make sure it fits in the box
bracket_screw_gap=0.5;// gap to fit the screw

bracket_l=pcb_w+15;   // height of bracket
bracket_l1=19;        // hole l
bracket_l2=3*screw_d[bracket_screw];
bracket_ld=pcb_wd;    // hole distance

bracket_h=10;         // depth of the U shape at the side of the screw
bracket_h1=4;         // depth of the U shape at the side where no screw is 
bracket_h2=2-bracket_gap/2;   // thickness of bracket
bracket_h3=5;         // hole h

bracket_w1=4;         // height of the mounting hole cube
bracket_tn=2;         // thickness of bracket
bracket_t=bracket_tn-bracket_gap/2;  // thickness of bracket - gap

bracket_offset_z=-10;  // bracket offset in elecbox z axis

function bracket_w(n)=step*n-bracket_gap;
function bracket_w2(n)=step*n-2*bracket_tn;
// file: ../pcb/pcb_dim.scad
// The pcb is the master object of the project
// therefore no other include files from other objects
// are necessary

// pcb constants
pcb_l =100;  // lenght of the pcb
pcb_ld = 94; // hole distance 
pcb_w=80;    // height of the pcb
pcb_wd = 67; // hole distance
pcb_wd1 = 9; // hole to edge distance 
pcb_d=3;     // diameter of holes
pcb_h=1.6;   // thickness
// main file
// Stepper module
// ==============

stepper="assembly"; // [assembly,front,back,print_front,print_back]

include <../pcb/pcb_dim.scad>
include <../bracket/bracket_dim.scad>
include <../motherboard/motherboard_dim.scad>
include <../library/linurs/linurs_screw_dim.scad>

use <../library/linurs/linurs_screw.scad>
use <../bracket/bracket.scad>
use <../pcb/pcb.scad>

module stepper_back(){
    difference(){
        translate([0,0,bracket_offset_z])back_bracket(n=1);
        
        translate([
          0,
          hx/2,
          z1+wx/2])
        cube([
          bracket_h,
          hx,
          wx],center=true); 
        
        translate([
          0,
          hx/2,
          z2+wx/2])
        cube([
          bracket_h,
          hx,
          wx],center=true); 
        
        translate([
          0,
          hx/2,
          z3+wx/2])
        cube([
          bracket_h,
          hx,
          wx],center=true);        
    }
}

module stepper_front(){
    z4=63.5;
    w4=8;
    
    difference(){
        translate([0,0,bracket_offset_z])front_bracket(n=1);
        
        translate([
          0,
          hx/2,
          z1+wx/2])
        cube([
          bracket_h,
          hx,
          wx],center=true); 
        
        translate([
          0,
          hx/2,
          z2+wx/2])
        cube([
          bracket_h,
          hx,
          wx],center=true);    
        
        // power connector
        translate([
          0,
          hx/2,
          z4+w4/2])
        cube([
          bracket_h,
          hx,
          w4],center=true);      
    }
}

// to have all wago cut outs the same
hx=14;
wx=14;
z1=15;
z2=30;
z3=45;

module stepper_assembly(){
    pcb_assembly();
    stepper_front();
    translate([pcb_l,0,0])stepper_back();
}

if(stepper=="assembly"){
  stepper_assembly();
}

if(stepper=="front"){
  stepper_front();
}

if(stepper=="back"){
  stepper_back();
}

if(stepper=="print_front"){
  rotate([0,-90,0])
    stepper_front();
}

if(stepper=="print_back"){
  rotate([0,90,0])stepper_back();
}
